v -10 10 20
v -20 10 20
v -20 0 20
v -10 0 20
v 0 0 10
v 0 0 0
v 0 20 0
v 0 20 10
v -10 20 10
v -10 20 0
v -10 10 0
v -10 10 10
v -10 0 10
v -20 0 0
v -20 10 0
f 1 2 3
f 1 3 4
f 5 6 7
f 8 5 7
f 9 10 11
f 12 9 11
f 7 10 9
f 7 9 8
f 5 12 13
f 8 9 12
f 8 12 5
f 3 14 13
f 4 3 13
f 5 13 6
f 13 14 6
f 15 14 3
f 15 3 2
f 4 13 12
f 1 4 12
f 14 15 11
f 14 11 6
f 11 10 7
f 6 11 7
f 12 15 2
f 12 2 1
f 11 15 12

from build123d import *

# Parameters (mm, degrees)
F0_W     = 10
F0_H     = 10
F1_DEPTH = 20
F2_DEPTH = 10


with BuildPart() as f1:
    # F0 (on Top) → F1 (new body)
    with BuildSketch(Plane.XY):
        with Locations((-15, 5)):
            Rectangle(F0_W, F0_H)
    extrude(amount=F1_DEPTH)

    # F0 (on Top) → F2 (join)
    with BuildSketch(Plane.XY):
        with Locations((-5, 15)):
            Rectangle(F0_W, F0_H)
        with Locations((-5, 5)):
            Rectangle(F0_W, F0_H)
    extrude(amount=F2_DEPTH)


solid = f1.part
